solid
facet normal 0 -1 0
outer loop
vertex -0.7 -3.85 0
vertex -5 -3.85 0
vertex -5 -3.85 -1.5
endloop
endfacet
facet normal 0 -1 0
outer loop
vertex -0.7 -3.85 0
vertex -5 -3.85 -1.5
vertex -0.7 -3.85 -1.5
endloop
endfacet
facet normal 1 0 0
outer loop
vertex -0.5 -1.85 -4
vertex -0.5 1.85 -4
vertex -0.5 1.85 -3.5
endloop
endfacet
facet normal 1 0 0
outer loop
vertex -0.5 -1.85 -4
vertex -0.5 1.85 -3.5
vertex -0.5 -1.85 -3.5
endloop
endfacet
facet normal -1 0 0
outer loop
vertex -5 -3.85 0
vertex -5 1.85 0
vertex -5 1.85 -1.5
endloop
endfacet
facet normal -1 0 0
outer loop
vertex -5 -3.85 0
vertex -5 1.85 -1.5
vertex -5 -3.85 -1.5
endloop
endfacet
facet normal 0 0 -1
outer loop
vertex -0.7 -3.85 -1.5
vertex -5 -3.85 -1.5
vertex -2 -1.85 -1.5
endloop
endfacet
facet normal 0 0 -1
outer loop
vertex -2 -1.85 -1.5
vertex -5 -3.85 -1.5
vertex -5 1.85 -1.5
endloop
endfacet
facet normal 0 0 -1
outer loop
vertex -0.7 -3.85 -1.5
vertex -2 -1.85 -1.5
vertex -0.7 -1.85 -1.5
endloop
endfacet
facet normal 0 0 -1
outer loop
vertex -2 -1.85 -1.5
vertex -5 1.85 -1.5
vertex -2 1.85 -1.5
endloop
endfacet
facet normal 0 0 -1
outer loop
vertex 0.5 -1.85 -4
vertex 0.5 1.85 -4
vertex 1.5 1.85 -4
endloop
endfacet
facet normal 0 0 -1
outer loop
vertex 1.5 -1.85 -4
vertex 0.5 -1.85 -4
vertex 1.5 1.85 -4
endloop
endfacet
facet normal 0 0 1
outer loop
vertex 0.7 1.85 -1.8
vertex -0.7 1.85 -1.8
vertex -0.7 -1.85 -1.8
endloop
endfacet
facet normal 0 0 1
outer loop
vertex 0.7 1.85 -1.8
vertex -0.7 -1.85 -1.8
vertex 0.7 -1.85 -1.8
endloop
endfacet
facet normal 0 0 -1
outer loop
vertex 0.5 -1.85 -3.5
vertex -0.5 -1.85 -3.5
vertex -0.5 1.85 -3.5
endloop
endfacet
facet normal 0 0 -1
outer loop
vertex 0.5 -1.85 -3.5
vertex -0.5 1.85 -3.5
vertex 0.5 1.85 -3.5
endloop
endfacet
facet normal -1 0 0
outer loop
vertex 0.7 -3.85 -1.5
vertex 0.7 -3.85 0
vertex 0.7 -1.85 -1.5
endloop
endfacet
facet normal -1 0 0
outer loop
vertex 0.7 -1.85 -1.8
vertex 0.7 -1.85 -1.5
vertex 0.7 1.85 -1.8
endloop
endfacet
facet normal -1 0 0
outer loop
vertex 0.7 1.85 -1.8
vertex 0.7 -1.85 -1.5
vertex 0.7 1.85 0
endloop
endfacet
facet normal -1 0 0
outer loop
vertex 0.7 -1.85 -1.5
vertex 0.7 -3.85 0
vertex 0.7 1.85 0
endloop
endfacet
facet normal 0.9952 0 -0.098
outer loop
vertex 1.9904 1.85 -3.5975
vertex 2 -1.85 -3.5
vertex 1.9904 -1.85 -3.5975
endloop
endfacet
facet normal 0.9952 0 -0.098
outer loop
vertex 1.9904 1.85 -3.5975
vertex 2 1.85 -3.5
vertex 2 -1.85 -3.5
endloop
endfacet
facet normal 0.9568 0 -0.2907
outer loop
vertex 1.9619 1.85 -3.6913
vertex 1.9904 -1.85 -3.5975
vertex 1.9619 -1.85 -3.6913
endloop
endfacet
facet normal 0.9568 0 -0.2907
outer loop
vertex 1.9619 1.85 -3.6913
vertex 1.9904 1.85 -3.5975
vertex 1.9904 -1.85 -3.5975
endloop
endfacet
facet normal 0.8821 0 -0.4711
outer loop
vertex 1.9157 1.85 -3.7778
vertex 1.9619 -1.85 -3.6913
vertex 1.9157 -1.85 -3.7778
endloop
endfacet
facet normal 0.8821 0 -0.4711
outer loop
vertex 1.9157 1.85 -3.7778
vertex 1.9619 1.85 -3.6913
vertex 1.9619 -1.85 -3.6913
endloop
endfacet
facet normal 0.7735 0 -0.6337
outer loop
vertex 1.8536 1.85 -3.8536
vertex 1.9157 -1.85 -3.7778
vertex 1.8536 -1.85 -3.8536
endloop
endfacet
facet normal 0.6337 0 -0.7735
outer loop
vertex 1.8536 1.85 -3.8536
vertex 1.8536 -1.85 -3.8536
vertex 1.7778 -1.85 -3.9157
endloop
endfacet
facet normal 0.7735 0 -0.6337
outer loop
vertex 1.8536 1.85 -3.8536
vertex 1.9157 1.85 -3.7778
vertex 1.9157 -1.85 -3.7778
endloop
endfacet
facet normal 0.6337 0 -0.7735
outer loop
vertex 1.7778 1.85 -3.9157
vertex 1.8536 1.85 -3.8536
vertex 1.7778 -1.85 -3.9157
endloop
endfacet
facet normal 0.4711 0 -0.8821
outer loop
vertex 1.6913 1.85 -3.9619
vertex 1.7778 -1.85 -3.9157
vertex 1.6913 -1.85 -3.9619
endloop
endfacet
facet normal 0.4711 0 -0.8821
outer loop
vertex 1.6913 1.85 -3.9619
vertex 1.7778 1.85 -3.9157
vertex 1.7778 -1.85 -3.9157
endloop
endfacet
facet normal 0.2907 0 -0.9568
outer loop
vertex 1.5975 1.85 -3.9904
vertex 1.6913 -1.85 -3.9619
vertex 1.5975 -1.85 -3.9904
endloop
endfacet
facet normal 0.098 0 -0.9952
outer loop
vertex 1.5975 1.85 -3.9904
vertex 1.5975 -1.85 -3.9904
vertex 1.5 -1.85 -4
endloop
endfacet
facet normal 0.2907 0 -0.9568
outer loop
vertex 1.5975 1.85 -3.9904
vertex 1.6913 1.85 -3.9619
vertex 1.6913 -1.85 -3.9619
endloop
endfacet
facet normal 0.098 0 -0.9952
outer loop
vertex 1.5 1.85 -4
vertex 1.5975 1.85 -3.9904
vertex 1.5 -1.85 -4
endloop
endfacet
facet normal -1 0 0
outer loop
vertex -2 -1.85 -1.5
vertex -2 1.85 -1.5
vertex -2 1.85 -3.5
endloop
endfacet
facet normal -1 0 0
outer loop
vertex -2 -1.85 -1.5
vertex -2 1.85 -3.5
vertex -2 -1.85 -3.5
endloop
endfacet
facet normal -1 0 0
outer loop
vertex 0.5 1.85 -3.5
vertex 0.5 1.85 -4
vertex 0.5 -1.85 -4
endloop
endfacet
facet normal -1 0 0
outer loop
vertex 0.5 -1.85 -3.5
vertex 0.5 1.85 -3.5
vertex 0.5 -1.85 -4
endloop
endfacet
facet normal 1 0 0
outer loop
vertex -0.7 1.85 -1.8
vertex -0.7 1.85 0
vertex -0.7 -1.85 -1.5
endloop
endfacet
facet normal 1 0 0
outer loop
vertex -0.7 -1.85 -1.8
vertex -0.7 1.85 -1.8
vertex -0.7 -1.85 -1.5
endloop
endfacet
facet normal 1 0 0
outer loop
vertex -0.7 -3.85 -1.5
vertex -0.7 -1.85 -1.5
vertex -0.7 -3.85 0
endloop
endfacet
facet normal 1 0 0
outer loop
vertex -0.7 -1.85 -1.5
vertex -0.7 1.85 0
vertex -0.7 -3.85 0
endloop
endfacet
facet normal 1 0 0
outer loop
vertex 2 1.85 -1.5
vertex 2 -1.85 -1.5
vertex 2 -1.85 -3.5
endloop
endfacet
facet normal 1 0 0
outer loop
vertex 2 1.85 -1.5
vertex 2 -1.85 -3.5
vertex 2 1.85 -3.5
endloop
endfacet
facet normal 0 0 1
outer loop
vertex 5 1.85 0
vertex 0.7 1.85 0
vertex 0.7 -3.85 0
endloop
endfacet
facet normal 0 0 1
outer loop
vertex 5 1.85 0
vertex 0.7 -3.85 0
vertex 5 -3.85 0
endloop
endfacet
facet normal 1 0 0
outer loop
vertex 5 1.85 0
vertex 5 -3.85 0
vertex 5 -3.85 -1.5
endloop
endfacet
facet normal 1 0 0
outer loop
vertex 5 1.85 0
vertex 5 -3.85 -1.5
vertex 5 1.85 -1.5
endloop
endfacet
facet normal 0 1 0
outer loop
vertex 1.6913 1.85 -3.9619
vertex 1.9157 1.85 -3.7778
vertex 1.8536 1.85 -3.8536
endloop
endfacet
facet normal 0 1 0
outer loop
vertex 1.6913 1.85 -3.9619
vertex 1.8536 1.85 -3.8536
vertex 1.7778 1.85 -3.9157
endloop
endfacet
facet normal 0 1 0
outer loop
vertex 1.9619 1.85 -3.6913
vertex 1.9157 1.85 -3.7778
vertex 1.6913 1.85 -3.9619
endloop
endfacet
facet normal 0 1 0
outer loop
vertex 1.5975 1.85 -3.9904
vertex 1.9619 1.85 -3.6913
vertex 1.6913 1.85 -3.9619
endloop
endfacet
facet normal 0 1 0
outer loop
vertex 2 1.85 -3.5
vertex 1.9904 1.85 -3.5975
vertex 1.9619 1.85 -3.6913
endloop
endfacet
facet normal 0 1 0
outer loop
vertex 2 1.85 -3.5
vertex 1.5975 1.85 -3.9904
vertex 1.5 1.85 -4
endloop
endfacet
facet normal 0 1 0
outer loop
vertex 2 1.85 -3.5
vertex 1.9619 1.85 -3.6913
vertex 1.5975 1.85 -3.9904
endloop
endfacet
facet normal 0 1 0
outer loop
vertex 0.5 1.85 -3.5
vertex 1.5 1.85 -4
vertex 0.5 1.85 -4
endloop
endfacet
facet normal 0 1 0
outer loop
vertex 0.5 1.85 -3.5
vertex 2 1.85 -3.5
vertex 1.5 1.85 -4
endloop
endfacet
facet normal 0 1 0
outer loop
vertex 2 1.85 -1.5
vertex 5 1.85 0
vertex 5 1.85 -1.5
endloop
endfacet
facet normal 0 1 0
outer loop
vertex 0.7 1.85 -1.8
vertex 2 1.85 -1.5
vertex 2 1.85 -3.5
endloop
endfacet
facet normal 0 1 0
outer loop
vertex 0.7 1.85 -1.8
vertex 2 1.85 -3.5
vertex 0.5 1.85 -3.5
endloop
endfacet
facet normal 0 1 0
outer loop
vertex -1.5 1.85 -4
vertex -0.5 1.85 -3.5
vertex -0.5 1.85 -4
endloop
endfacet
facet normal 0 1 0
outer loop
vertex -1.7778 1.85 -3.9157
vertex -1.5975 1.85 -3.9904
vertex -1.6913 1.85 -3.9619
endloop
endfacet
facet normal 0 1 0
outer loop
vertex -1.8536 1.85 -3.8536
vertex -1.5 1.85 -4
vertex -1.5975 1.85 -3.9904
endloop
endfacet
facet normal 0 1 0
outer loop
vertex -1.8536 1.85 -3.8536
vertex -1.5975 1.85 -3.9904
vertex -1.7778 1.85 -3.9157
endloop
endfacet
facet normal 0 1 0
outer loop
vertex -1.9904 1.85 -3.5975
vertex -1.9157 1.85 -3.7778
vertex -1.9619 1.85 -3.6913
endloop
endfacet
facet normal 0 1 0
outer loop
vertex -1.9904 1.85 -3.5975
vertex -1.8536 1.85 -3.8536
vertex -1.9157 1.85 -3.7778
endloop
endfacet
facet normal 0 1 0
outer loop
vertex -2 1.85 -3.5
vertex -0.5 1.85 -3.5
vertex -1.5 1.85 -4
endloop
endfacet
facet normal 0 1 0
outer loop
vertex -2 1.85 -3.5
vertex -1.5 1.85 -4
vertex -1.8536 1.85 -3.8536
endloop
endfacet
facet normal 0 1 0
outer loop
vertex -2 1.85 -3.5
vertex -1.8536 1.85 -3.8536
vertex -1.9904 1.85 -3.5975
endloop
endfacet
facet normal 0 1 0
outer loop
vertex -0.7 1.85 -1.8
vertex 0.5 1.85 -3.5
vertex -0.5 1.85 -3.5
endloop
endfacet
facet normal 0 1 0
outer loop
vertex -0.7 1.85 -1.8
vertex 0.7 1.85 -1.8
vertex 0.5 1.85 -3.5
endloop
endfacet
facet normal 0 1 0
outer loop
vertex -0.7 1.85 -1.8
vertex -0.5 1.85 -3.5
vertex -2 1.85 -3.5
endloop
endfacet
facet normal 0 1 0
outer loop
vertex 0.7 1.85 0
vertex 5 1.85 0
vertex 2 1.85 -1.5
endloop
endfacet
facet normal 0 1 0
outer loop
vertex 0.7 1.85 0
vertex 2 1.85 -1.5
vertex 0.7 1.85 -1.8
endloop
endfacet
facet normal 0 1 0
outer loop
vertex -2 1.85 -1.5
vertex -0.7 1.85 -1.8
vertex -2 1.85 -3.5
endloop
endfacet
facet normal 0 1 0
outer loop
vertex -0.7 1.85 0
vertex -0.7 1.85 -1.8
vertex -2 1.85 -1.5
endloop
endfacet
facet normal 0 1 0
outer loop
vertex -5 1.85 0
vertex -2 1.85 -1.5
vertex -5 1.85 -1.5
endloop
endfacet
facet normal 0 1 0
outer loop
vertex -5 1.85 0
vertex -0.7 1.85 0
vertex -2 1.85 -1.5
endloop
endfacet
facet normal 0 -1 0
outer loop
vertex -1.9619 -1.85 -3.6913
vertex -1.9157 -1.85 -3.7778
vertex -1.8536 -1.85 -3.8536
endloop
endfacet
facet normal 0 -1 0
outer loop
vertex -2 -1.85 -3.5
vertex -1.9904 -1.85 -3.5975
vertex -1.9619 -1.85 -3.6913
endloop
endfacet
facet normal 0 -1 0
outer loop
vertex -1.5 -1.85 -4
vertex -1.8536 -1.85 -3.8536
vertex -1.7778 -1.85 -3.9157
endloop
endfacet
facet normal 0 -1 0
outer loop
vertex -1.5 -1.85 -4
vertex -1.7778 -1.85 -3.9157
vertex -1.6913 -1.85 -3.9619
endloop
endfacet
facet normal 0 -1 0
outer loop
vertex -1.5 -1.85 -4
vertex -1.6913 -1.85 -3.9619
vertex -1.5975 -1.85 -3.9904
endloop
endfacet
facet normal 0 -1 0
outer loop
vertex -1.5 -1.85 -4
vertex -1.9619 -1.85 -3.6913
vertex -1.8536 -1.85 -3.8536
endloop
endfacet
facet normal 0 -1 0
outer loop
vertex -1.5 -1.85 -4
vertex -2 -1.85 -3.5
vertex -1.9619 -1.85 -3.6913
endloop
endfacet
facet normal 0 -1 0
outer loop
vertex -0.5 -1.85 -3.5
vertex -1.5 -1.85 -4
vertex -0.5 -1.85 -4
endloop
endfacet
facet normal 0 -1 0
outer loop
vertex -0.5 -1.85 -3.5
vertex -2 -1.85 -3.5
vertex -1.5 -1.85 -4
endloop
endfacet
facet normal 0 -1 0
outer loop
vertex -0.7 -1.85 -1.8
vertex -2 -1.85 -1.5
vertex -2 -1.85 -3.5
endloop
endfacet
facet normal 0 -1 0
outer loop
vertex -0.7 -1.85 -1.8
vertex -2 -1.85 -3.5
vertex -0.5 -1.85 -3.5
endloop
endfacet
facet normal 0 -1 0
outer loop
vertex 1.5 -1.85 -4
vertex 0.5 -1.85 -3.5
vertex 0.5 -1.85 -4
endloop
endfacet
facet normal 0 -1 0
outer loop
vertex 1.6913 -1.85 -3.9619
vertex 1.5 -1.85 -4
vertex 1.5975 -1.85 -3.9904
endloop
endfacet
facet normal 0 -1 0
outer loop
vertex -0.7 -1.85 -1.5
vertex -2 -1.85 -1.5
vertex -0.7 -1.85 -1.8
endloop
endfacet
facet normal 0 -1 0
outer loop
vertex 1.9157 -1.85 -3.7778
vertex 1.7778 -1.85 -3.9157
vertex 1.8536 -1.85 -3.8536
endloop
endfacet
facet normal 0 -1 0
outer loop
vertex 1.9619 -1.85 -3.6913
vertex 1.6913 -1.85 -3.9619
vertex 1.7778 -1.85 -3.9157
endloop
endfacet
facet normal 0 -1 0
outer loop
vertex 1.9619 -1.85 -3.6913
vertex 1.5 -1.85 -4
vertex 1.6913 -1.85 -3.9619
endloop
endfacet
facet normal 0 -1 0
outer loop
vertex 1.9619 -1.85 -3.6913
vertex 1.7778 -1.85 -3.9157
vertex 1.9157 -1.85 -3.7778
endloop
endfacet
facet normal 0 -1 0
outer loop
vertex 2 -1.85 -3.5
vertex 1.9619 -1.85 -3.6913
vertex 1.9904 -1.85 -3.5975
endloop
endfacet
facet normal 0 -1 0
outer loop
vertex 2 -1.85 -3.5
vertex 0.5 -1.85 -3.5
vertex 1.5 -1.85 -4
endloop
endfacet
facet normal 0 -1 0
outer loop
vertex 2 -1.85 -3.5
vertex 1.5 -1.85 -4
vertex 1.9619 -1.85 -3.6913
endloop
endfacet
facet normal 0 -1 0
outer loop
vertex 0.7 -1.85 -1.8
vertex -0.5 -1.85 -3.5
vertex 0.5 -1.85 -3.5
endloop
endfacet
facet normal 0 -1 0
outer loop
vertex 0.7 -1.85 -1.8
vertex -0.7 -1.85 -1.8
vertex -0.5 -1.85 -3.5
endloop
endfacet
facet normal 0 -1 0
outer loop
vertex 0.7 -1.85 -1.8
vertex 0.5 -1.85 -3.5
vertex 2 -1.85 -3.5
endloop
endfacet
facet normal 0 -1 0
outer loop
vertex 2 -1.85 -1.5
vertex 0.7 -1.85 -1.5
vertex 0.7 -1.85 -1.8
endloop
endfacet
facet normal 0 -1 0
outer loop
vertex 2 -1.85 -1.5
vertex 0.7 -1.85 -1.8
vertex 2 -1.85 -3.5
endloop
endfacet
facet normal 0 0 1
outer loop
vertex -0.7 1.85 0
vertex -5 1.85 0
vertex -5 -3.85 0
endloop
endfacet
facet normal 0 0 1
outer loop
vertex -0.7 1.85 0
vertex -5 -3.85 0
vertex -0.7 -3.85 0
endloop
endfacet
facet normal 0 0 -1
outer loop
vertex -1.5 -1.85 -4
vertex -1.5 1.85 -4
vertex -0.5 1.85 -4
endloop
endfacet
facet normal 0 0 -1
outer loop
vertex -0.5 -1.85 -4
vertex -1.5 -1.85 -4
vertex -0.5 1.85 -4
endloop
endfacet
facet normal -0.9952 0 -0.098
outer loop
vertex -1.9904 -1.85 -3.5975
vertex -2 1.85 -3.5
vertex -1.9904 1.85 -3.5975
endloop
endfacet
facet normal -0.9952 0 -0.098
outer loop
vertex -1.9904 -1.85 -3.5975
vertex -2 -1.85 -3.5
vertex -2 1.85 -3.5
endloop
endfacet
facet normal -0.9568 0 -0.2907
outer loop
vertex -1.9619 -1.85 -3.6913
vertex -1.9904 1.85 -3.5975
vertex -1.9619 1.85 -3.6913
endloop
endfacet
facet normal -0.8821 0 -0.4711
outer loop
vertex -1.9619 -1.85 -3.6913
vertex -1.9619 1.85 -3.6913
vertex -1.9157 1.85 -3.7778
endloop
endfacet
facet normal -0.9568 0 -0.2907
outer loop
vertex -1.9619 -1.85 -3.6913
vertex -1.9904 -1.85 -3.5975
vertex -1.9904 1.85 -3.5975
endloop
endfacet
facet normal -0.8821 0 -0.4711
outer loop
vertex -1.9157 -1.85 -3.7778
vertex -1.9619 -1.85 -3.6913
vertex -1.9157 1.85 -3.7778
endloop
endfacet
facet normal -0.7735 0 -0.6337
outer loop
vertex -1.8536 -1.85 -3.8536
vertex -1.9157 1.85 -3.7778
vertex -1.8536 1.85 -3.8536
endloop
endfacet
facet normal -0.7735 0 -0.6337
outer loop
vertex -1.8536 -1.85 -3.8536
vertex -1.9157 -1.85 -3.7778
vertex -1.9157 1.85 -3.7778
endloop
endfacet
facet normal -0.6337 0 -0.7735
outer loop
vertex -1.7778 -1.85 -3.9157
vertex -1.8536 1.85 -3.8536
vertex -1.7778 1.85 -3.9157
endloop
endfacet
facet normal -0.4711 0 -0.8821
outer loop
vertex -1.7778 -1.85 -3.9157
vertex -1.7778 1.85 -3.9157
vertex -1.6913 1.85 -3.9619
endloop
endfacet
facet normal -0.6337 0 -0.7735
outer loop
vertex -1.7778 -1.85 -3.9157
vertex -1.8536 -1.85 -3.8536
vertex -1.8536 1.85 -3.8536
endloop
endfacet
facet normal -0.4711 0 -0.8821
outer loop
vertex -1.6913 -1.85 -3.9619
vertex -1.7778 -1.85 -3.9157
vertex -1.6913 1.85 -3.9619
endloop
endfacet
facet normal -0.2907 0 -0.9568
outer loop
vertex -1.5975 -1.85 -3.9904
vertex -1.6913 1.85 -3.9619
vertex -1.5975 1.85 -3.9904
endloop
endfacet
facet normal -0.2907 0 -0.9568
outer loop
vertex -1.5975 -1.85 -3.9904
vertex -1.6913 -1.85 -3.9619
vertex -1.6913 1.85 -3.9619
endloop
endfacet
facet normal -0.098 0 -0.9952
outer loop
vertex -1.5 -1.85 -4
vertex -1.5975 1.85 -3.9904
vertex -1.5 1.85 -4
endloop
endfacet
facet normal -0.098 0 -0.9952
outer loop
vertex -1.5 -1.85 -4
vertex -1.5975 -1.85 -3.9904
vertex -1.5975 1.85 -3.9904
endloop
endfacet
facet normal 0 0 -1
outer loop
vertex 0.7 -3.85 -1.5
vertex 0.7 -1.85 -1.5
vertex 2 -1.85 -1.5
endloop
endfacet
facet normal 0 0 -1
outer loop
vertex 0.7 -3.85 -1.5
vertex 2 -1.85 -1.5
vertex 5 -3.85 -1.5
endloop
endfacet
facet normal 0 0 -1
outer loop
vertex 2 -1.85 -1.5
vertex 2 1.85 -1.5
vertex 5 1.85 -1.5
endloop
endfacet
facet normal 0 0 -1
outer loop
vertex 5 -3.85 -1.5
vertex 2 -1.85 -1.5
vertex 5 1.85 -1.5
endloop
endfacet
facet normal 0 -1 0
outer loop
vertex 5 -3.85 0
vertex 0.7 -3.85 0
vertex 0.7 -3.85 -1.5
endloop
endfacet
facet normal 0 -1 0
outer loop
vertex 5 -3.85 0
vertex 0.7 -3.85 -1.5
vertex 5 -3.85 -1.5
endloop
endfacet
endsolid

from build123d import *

# Parameters (mm, degrees)
F0_W     = 1.4
F0_H     = 2
F1_DEPTH = 1.5
F0_H_2   = 1.1
F0_H_3   = 1.5
F2_DEPTH = 4
F3_DEPTH = 1.8
F4_W     = 1
F4_H     = 3.7
F5_DEPTH = 0.5
F6_R     = 0.5


with BuildPart() as f1:
    # F0 (on Top) → F1 (new body)
    with BuildSketch(Plane.XY):
        Polygon((2, -1.85), (0.7, -1.85), (0.7, -3.85), (5, -3.85), (5, 1.85), (2, 1.85), align=None)
        with Locations((0, -2.85)):
            Rectangle(F0_W, F0_H)
        Polygon((-0.7, -3.85), (-0.7, -1.85), (-2, -1.85), (-2, 1.85), (-5, 1.85), (-5, -3.85), align=None)
    extrude(amount=-F1_DEPTH)

    # F0 (on Top) → F2 (join)
    with BuildSketch(Plane.XY):
        with Locations((0, -1.3)):
            Rectangle(F0_W, F0_H_2)
        Rectangle(F0_W, F0_H_3)
        Polygon((-0.7, -1.85), (-0.7, -0.75), (-0.7, 0.75), (-0.7, 1.85), (-2, 1.85), (-2, -1.85), align=None)
        with Locations((0, 1.3)):
            Rectangle(F0_W, F0_H_2)
        Polygon((0.7, 0.75), (0.7, -0.75), (0.7, -1.85), (2, -1.85), (2, 1.85), (0.7, 1.85), align=None)
    extrude(amount=-F2_DEPTH)

    # F0 (on Top) → F3 (cut)
    with BuildSketch(Plane.XY):
        Rectangle(F0_W, F0_H_3)
        with Locations((0, 1.3)):
            Rectangle(F0_W, F0_H_2)
        with Locations((0, -1.3)):
            Rectangle(F0_W, F0_H_2)
        with Locations((0, -2.85)):
            Rectangle(F0_W, F0_H)
    extrude(amount=-F3_DEPTH, mode=Mode.SUBTRACT)

    # F4 (on face) → F5 (cut)
    with BuildSketch(Plane(origin=(0, 0, -4), x_dir=(1, 0, 0), z_dir=(0, 0, -1))):
        Rectangle(F4_W, F4_H)
    extrude(amount=-F5_DEPTH, mode=Mode.SUBTRACT)

    # F6
    f6_edges = [f1.edges().sort_by_distance(p)[0] for p in [
        (-2, 0, -4),
        (2, 0, -4),
    ]]
    fillet(f6_edges, radius=F6_R)


solid = f1.part
